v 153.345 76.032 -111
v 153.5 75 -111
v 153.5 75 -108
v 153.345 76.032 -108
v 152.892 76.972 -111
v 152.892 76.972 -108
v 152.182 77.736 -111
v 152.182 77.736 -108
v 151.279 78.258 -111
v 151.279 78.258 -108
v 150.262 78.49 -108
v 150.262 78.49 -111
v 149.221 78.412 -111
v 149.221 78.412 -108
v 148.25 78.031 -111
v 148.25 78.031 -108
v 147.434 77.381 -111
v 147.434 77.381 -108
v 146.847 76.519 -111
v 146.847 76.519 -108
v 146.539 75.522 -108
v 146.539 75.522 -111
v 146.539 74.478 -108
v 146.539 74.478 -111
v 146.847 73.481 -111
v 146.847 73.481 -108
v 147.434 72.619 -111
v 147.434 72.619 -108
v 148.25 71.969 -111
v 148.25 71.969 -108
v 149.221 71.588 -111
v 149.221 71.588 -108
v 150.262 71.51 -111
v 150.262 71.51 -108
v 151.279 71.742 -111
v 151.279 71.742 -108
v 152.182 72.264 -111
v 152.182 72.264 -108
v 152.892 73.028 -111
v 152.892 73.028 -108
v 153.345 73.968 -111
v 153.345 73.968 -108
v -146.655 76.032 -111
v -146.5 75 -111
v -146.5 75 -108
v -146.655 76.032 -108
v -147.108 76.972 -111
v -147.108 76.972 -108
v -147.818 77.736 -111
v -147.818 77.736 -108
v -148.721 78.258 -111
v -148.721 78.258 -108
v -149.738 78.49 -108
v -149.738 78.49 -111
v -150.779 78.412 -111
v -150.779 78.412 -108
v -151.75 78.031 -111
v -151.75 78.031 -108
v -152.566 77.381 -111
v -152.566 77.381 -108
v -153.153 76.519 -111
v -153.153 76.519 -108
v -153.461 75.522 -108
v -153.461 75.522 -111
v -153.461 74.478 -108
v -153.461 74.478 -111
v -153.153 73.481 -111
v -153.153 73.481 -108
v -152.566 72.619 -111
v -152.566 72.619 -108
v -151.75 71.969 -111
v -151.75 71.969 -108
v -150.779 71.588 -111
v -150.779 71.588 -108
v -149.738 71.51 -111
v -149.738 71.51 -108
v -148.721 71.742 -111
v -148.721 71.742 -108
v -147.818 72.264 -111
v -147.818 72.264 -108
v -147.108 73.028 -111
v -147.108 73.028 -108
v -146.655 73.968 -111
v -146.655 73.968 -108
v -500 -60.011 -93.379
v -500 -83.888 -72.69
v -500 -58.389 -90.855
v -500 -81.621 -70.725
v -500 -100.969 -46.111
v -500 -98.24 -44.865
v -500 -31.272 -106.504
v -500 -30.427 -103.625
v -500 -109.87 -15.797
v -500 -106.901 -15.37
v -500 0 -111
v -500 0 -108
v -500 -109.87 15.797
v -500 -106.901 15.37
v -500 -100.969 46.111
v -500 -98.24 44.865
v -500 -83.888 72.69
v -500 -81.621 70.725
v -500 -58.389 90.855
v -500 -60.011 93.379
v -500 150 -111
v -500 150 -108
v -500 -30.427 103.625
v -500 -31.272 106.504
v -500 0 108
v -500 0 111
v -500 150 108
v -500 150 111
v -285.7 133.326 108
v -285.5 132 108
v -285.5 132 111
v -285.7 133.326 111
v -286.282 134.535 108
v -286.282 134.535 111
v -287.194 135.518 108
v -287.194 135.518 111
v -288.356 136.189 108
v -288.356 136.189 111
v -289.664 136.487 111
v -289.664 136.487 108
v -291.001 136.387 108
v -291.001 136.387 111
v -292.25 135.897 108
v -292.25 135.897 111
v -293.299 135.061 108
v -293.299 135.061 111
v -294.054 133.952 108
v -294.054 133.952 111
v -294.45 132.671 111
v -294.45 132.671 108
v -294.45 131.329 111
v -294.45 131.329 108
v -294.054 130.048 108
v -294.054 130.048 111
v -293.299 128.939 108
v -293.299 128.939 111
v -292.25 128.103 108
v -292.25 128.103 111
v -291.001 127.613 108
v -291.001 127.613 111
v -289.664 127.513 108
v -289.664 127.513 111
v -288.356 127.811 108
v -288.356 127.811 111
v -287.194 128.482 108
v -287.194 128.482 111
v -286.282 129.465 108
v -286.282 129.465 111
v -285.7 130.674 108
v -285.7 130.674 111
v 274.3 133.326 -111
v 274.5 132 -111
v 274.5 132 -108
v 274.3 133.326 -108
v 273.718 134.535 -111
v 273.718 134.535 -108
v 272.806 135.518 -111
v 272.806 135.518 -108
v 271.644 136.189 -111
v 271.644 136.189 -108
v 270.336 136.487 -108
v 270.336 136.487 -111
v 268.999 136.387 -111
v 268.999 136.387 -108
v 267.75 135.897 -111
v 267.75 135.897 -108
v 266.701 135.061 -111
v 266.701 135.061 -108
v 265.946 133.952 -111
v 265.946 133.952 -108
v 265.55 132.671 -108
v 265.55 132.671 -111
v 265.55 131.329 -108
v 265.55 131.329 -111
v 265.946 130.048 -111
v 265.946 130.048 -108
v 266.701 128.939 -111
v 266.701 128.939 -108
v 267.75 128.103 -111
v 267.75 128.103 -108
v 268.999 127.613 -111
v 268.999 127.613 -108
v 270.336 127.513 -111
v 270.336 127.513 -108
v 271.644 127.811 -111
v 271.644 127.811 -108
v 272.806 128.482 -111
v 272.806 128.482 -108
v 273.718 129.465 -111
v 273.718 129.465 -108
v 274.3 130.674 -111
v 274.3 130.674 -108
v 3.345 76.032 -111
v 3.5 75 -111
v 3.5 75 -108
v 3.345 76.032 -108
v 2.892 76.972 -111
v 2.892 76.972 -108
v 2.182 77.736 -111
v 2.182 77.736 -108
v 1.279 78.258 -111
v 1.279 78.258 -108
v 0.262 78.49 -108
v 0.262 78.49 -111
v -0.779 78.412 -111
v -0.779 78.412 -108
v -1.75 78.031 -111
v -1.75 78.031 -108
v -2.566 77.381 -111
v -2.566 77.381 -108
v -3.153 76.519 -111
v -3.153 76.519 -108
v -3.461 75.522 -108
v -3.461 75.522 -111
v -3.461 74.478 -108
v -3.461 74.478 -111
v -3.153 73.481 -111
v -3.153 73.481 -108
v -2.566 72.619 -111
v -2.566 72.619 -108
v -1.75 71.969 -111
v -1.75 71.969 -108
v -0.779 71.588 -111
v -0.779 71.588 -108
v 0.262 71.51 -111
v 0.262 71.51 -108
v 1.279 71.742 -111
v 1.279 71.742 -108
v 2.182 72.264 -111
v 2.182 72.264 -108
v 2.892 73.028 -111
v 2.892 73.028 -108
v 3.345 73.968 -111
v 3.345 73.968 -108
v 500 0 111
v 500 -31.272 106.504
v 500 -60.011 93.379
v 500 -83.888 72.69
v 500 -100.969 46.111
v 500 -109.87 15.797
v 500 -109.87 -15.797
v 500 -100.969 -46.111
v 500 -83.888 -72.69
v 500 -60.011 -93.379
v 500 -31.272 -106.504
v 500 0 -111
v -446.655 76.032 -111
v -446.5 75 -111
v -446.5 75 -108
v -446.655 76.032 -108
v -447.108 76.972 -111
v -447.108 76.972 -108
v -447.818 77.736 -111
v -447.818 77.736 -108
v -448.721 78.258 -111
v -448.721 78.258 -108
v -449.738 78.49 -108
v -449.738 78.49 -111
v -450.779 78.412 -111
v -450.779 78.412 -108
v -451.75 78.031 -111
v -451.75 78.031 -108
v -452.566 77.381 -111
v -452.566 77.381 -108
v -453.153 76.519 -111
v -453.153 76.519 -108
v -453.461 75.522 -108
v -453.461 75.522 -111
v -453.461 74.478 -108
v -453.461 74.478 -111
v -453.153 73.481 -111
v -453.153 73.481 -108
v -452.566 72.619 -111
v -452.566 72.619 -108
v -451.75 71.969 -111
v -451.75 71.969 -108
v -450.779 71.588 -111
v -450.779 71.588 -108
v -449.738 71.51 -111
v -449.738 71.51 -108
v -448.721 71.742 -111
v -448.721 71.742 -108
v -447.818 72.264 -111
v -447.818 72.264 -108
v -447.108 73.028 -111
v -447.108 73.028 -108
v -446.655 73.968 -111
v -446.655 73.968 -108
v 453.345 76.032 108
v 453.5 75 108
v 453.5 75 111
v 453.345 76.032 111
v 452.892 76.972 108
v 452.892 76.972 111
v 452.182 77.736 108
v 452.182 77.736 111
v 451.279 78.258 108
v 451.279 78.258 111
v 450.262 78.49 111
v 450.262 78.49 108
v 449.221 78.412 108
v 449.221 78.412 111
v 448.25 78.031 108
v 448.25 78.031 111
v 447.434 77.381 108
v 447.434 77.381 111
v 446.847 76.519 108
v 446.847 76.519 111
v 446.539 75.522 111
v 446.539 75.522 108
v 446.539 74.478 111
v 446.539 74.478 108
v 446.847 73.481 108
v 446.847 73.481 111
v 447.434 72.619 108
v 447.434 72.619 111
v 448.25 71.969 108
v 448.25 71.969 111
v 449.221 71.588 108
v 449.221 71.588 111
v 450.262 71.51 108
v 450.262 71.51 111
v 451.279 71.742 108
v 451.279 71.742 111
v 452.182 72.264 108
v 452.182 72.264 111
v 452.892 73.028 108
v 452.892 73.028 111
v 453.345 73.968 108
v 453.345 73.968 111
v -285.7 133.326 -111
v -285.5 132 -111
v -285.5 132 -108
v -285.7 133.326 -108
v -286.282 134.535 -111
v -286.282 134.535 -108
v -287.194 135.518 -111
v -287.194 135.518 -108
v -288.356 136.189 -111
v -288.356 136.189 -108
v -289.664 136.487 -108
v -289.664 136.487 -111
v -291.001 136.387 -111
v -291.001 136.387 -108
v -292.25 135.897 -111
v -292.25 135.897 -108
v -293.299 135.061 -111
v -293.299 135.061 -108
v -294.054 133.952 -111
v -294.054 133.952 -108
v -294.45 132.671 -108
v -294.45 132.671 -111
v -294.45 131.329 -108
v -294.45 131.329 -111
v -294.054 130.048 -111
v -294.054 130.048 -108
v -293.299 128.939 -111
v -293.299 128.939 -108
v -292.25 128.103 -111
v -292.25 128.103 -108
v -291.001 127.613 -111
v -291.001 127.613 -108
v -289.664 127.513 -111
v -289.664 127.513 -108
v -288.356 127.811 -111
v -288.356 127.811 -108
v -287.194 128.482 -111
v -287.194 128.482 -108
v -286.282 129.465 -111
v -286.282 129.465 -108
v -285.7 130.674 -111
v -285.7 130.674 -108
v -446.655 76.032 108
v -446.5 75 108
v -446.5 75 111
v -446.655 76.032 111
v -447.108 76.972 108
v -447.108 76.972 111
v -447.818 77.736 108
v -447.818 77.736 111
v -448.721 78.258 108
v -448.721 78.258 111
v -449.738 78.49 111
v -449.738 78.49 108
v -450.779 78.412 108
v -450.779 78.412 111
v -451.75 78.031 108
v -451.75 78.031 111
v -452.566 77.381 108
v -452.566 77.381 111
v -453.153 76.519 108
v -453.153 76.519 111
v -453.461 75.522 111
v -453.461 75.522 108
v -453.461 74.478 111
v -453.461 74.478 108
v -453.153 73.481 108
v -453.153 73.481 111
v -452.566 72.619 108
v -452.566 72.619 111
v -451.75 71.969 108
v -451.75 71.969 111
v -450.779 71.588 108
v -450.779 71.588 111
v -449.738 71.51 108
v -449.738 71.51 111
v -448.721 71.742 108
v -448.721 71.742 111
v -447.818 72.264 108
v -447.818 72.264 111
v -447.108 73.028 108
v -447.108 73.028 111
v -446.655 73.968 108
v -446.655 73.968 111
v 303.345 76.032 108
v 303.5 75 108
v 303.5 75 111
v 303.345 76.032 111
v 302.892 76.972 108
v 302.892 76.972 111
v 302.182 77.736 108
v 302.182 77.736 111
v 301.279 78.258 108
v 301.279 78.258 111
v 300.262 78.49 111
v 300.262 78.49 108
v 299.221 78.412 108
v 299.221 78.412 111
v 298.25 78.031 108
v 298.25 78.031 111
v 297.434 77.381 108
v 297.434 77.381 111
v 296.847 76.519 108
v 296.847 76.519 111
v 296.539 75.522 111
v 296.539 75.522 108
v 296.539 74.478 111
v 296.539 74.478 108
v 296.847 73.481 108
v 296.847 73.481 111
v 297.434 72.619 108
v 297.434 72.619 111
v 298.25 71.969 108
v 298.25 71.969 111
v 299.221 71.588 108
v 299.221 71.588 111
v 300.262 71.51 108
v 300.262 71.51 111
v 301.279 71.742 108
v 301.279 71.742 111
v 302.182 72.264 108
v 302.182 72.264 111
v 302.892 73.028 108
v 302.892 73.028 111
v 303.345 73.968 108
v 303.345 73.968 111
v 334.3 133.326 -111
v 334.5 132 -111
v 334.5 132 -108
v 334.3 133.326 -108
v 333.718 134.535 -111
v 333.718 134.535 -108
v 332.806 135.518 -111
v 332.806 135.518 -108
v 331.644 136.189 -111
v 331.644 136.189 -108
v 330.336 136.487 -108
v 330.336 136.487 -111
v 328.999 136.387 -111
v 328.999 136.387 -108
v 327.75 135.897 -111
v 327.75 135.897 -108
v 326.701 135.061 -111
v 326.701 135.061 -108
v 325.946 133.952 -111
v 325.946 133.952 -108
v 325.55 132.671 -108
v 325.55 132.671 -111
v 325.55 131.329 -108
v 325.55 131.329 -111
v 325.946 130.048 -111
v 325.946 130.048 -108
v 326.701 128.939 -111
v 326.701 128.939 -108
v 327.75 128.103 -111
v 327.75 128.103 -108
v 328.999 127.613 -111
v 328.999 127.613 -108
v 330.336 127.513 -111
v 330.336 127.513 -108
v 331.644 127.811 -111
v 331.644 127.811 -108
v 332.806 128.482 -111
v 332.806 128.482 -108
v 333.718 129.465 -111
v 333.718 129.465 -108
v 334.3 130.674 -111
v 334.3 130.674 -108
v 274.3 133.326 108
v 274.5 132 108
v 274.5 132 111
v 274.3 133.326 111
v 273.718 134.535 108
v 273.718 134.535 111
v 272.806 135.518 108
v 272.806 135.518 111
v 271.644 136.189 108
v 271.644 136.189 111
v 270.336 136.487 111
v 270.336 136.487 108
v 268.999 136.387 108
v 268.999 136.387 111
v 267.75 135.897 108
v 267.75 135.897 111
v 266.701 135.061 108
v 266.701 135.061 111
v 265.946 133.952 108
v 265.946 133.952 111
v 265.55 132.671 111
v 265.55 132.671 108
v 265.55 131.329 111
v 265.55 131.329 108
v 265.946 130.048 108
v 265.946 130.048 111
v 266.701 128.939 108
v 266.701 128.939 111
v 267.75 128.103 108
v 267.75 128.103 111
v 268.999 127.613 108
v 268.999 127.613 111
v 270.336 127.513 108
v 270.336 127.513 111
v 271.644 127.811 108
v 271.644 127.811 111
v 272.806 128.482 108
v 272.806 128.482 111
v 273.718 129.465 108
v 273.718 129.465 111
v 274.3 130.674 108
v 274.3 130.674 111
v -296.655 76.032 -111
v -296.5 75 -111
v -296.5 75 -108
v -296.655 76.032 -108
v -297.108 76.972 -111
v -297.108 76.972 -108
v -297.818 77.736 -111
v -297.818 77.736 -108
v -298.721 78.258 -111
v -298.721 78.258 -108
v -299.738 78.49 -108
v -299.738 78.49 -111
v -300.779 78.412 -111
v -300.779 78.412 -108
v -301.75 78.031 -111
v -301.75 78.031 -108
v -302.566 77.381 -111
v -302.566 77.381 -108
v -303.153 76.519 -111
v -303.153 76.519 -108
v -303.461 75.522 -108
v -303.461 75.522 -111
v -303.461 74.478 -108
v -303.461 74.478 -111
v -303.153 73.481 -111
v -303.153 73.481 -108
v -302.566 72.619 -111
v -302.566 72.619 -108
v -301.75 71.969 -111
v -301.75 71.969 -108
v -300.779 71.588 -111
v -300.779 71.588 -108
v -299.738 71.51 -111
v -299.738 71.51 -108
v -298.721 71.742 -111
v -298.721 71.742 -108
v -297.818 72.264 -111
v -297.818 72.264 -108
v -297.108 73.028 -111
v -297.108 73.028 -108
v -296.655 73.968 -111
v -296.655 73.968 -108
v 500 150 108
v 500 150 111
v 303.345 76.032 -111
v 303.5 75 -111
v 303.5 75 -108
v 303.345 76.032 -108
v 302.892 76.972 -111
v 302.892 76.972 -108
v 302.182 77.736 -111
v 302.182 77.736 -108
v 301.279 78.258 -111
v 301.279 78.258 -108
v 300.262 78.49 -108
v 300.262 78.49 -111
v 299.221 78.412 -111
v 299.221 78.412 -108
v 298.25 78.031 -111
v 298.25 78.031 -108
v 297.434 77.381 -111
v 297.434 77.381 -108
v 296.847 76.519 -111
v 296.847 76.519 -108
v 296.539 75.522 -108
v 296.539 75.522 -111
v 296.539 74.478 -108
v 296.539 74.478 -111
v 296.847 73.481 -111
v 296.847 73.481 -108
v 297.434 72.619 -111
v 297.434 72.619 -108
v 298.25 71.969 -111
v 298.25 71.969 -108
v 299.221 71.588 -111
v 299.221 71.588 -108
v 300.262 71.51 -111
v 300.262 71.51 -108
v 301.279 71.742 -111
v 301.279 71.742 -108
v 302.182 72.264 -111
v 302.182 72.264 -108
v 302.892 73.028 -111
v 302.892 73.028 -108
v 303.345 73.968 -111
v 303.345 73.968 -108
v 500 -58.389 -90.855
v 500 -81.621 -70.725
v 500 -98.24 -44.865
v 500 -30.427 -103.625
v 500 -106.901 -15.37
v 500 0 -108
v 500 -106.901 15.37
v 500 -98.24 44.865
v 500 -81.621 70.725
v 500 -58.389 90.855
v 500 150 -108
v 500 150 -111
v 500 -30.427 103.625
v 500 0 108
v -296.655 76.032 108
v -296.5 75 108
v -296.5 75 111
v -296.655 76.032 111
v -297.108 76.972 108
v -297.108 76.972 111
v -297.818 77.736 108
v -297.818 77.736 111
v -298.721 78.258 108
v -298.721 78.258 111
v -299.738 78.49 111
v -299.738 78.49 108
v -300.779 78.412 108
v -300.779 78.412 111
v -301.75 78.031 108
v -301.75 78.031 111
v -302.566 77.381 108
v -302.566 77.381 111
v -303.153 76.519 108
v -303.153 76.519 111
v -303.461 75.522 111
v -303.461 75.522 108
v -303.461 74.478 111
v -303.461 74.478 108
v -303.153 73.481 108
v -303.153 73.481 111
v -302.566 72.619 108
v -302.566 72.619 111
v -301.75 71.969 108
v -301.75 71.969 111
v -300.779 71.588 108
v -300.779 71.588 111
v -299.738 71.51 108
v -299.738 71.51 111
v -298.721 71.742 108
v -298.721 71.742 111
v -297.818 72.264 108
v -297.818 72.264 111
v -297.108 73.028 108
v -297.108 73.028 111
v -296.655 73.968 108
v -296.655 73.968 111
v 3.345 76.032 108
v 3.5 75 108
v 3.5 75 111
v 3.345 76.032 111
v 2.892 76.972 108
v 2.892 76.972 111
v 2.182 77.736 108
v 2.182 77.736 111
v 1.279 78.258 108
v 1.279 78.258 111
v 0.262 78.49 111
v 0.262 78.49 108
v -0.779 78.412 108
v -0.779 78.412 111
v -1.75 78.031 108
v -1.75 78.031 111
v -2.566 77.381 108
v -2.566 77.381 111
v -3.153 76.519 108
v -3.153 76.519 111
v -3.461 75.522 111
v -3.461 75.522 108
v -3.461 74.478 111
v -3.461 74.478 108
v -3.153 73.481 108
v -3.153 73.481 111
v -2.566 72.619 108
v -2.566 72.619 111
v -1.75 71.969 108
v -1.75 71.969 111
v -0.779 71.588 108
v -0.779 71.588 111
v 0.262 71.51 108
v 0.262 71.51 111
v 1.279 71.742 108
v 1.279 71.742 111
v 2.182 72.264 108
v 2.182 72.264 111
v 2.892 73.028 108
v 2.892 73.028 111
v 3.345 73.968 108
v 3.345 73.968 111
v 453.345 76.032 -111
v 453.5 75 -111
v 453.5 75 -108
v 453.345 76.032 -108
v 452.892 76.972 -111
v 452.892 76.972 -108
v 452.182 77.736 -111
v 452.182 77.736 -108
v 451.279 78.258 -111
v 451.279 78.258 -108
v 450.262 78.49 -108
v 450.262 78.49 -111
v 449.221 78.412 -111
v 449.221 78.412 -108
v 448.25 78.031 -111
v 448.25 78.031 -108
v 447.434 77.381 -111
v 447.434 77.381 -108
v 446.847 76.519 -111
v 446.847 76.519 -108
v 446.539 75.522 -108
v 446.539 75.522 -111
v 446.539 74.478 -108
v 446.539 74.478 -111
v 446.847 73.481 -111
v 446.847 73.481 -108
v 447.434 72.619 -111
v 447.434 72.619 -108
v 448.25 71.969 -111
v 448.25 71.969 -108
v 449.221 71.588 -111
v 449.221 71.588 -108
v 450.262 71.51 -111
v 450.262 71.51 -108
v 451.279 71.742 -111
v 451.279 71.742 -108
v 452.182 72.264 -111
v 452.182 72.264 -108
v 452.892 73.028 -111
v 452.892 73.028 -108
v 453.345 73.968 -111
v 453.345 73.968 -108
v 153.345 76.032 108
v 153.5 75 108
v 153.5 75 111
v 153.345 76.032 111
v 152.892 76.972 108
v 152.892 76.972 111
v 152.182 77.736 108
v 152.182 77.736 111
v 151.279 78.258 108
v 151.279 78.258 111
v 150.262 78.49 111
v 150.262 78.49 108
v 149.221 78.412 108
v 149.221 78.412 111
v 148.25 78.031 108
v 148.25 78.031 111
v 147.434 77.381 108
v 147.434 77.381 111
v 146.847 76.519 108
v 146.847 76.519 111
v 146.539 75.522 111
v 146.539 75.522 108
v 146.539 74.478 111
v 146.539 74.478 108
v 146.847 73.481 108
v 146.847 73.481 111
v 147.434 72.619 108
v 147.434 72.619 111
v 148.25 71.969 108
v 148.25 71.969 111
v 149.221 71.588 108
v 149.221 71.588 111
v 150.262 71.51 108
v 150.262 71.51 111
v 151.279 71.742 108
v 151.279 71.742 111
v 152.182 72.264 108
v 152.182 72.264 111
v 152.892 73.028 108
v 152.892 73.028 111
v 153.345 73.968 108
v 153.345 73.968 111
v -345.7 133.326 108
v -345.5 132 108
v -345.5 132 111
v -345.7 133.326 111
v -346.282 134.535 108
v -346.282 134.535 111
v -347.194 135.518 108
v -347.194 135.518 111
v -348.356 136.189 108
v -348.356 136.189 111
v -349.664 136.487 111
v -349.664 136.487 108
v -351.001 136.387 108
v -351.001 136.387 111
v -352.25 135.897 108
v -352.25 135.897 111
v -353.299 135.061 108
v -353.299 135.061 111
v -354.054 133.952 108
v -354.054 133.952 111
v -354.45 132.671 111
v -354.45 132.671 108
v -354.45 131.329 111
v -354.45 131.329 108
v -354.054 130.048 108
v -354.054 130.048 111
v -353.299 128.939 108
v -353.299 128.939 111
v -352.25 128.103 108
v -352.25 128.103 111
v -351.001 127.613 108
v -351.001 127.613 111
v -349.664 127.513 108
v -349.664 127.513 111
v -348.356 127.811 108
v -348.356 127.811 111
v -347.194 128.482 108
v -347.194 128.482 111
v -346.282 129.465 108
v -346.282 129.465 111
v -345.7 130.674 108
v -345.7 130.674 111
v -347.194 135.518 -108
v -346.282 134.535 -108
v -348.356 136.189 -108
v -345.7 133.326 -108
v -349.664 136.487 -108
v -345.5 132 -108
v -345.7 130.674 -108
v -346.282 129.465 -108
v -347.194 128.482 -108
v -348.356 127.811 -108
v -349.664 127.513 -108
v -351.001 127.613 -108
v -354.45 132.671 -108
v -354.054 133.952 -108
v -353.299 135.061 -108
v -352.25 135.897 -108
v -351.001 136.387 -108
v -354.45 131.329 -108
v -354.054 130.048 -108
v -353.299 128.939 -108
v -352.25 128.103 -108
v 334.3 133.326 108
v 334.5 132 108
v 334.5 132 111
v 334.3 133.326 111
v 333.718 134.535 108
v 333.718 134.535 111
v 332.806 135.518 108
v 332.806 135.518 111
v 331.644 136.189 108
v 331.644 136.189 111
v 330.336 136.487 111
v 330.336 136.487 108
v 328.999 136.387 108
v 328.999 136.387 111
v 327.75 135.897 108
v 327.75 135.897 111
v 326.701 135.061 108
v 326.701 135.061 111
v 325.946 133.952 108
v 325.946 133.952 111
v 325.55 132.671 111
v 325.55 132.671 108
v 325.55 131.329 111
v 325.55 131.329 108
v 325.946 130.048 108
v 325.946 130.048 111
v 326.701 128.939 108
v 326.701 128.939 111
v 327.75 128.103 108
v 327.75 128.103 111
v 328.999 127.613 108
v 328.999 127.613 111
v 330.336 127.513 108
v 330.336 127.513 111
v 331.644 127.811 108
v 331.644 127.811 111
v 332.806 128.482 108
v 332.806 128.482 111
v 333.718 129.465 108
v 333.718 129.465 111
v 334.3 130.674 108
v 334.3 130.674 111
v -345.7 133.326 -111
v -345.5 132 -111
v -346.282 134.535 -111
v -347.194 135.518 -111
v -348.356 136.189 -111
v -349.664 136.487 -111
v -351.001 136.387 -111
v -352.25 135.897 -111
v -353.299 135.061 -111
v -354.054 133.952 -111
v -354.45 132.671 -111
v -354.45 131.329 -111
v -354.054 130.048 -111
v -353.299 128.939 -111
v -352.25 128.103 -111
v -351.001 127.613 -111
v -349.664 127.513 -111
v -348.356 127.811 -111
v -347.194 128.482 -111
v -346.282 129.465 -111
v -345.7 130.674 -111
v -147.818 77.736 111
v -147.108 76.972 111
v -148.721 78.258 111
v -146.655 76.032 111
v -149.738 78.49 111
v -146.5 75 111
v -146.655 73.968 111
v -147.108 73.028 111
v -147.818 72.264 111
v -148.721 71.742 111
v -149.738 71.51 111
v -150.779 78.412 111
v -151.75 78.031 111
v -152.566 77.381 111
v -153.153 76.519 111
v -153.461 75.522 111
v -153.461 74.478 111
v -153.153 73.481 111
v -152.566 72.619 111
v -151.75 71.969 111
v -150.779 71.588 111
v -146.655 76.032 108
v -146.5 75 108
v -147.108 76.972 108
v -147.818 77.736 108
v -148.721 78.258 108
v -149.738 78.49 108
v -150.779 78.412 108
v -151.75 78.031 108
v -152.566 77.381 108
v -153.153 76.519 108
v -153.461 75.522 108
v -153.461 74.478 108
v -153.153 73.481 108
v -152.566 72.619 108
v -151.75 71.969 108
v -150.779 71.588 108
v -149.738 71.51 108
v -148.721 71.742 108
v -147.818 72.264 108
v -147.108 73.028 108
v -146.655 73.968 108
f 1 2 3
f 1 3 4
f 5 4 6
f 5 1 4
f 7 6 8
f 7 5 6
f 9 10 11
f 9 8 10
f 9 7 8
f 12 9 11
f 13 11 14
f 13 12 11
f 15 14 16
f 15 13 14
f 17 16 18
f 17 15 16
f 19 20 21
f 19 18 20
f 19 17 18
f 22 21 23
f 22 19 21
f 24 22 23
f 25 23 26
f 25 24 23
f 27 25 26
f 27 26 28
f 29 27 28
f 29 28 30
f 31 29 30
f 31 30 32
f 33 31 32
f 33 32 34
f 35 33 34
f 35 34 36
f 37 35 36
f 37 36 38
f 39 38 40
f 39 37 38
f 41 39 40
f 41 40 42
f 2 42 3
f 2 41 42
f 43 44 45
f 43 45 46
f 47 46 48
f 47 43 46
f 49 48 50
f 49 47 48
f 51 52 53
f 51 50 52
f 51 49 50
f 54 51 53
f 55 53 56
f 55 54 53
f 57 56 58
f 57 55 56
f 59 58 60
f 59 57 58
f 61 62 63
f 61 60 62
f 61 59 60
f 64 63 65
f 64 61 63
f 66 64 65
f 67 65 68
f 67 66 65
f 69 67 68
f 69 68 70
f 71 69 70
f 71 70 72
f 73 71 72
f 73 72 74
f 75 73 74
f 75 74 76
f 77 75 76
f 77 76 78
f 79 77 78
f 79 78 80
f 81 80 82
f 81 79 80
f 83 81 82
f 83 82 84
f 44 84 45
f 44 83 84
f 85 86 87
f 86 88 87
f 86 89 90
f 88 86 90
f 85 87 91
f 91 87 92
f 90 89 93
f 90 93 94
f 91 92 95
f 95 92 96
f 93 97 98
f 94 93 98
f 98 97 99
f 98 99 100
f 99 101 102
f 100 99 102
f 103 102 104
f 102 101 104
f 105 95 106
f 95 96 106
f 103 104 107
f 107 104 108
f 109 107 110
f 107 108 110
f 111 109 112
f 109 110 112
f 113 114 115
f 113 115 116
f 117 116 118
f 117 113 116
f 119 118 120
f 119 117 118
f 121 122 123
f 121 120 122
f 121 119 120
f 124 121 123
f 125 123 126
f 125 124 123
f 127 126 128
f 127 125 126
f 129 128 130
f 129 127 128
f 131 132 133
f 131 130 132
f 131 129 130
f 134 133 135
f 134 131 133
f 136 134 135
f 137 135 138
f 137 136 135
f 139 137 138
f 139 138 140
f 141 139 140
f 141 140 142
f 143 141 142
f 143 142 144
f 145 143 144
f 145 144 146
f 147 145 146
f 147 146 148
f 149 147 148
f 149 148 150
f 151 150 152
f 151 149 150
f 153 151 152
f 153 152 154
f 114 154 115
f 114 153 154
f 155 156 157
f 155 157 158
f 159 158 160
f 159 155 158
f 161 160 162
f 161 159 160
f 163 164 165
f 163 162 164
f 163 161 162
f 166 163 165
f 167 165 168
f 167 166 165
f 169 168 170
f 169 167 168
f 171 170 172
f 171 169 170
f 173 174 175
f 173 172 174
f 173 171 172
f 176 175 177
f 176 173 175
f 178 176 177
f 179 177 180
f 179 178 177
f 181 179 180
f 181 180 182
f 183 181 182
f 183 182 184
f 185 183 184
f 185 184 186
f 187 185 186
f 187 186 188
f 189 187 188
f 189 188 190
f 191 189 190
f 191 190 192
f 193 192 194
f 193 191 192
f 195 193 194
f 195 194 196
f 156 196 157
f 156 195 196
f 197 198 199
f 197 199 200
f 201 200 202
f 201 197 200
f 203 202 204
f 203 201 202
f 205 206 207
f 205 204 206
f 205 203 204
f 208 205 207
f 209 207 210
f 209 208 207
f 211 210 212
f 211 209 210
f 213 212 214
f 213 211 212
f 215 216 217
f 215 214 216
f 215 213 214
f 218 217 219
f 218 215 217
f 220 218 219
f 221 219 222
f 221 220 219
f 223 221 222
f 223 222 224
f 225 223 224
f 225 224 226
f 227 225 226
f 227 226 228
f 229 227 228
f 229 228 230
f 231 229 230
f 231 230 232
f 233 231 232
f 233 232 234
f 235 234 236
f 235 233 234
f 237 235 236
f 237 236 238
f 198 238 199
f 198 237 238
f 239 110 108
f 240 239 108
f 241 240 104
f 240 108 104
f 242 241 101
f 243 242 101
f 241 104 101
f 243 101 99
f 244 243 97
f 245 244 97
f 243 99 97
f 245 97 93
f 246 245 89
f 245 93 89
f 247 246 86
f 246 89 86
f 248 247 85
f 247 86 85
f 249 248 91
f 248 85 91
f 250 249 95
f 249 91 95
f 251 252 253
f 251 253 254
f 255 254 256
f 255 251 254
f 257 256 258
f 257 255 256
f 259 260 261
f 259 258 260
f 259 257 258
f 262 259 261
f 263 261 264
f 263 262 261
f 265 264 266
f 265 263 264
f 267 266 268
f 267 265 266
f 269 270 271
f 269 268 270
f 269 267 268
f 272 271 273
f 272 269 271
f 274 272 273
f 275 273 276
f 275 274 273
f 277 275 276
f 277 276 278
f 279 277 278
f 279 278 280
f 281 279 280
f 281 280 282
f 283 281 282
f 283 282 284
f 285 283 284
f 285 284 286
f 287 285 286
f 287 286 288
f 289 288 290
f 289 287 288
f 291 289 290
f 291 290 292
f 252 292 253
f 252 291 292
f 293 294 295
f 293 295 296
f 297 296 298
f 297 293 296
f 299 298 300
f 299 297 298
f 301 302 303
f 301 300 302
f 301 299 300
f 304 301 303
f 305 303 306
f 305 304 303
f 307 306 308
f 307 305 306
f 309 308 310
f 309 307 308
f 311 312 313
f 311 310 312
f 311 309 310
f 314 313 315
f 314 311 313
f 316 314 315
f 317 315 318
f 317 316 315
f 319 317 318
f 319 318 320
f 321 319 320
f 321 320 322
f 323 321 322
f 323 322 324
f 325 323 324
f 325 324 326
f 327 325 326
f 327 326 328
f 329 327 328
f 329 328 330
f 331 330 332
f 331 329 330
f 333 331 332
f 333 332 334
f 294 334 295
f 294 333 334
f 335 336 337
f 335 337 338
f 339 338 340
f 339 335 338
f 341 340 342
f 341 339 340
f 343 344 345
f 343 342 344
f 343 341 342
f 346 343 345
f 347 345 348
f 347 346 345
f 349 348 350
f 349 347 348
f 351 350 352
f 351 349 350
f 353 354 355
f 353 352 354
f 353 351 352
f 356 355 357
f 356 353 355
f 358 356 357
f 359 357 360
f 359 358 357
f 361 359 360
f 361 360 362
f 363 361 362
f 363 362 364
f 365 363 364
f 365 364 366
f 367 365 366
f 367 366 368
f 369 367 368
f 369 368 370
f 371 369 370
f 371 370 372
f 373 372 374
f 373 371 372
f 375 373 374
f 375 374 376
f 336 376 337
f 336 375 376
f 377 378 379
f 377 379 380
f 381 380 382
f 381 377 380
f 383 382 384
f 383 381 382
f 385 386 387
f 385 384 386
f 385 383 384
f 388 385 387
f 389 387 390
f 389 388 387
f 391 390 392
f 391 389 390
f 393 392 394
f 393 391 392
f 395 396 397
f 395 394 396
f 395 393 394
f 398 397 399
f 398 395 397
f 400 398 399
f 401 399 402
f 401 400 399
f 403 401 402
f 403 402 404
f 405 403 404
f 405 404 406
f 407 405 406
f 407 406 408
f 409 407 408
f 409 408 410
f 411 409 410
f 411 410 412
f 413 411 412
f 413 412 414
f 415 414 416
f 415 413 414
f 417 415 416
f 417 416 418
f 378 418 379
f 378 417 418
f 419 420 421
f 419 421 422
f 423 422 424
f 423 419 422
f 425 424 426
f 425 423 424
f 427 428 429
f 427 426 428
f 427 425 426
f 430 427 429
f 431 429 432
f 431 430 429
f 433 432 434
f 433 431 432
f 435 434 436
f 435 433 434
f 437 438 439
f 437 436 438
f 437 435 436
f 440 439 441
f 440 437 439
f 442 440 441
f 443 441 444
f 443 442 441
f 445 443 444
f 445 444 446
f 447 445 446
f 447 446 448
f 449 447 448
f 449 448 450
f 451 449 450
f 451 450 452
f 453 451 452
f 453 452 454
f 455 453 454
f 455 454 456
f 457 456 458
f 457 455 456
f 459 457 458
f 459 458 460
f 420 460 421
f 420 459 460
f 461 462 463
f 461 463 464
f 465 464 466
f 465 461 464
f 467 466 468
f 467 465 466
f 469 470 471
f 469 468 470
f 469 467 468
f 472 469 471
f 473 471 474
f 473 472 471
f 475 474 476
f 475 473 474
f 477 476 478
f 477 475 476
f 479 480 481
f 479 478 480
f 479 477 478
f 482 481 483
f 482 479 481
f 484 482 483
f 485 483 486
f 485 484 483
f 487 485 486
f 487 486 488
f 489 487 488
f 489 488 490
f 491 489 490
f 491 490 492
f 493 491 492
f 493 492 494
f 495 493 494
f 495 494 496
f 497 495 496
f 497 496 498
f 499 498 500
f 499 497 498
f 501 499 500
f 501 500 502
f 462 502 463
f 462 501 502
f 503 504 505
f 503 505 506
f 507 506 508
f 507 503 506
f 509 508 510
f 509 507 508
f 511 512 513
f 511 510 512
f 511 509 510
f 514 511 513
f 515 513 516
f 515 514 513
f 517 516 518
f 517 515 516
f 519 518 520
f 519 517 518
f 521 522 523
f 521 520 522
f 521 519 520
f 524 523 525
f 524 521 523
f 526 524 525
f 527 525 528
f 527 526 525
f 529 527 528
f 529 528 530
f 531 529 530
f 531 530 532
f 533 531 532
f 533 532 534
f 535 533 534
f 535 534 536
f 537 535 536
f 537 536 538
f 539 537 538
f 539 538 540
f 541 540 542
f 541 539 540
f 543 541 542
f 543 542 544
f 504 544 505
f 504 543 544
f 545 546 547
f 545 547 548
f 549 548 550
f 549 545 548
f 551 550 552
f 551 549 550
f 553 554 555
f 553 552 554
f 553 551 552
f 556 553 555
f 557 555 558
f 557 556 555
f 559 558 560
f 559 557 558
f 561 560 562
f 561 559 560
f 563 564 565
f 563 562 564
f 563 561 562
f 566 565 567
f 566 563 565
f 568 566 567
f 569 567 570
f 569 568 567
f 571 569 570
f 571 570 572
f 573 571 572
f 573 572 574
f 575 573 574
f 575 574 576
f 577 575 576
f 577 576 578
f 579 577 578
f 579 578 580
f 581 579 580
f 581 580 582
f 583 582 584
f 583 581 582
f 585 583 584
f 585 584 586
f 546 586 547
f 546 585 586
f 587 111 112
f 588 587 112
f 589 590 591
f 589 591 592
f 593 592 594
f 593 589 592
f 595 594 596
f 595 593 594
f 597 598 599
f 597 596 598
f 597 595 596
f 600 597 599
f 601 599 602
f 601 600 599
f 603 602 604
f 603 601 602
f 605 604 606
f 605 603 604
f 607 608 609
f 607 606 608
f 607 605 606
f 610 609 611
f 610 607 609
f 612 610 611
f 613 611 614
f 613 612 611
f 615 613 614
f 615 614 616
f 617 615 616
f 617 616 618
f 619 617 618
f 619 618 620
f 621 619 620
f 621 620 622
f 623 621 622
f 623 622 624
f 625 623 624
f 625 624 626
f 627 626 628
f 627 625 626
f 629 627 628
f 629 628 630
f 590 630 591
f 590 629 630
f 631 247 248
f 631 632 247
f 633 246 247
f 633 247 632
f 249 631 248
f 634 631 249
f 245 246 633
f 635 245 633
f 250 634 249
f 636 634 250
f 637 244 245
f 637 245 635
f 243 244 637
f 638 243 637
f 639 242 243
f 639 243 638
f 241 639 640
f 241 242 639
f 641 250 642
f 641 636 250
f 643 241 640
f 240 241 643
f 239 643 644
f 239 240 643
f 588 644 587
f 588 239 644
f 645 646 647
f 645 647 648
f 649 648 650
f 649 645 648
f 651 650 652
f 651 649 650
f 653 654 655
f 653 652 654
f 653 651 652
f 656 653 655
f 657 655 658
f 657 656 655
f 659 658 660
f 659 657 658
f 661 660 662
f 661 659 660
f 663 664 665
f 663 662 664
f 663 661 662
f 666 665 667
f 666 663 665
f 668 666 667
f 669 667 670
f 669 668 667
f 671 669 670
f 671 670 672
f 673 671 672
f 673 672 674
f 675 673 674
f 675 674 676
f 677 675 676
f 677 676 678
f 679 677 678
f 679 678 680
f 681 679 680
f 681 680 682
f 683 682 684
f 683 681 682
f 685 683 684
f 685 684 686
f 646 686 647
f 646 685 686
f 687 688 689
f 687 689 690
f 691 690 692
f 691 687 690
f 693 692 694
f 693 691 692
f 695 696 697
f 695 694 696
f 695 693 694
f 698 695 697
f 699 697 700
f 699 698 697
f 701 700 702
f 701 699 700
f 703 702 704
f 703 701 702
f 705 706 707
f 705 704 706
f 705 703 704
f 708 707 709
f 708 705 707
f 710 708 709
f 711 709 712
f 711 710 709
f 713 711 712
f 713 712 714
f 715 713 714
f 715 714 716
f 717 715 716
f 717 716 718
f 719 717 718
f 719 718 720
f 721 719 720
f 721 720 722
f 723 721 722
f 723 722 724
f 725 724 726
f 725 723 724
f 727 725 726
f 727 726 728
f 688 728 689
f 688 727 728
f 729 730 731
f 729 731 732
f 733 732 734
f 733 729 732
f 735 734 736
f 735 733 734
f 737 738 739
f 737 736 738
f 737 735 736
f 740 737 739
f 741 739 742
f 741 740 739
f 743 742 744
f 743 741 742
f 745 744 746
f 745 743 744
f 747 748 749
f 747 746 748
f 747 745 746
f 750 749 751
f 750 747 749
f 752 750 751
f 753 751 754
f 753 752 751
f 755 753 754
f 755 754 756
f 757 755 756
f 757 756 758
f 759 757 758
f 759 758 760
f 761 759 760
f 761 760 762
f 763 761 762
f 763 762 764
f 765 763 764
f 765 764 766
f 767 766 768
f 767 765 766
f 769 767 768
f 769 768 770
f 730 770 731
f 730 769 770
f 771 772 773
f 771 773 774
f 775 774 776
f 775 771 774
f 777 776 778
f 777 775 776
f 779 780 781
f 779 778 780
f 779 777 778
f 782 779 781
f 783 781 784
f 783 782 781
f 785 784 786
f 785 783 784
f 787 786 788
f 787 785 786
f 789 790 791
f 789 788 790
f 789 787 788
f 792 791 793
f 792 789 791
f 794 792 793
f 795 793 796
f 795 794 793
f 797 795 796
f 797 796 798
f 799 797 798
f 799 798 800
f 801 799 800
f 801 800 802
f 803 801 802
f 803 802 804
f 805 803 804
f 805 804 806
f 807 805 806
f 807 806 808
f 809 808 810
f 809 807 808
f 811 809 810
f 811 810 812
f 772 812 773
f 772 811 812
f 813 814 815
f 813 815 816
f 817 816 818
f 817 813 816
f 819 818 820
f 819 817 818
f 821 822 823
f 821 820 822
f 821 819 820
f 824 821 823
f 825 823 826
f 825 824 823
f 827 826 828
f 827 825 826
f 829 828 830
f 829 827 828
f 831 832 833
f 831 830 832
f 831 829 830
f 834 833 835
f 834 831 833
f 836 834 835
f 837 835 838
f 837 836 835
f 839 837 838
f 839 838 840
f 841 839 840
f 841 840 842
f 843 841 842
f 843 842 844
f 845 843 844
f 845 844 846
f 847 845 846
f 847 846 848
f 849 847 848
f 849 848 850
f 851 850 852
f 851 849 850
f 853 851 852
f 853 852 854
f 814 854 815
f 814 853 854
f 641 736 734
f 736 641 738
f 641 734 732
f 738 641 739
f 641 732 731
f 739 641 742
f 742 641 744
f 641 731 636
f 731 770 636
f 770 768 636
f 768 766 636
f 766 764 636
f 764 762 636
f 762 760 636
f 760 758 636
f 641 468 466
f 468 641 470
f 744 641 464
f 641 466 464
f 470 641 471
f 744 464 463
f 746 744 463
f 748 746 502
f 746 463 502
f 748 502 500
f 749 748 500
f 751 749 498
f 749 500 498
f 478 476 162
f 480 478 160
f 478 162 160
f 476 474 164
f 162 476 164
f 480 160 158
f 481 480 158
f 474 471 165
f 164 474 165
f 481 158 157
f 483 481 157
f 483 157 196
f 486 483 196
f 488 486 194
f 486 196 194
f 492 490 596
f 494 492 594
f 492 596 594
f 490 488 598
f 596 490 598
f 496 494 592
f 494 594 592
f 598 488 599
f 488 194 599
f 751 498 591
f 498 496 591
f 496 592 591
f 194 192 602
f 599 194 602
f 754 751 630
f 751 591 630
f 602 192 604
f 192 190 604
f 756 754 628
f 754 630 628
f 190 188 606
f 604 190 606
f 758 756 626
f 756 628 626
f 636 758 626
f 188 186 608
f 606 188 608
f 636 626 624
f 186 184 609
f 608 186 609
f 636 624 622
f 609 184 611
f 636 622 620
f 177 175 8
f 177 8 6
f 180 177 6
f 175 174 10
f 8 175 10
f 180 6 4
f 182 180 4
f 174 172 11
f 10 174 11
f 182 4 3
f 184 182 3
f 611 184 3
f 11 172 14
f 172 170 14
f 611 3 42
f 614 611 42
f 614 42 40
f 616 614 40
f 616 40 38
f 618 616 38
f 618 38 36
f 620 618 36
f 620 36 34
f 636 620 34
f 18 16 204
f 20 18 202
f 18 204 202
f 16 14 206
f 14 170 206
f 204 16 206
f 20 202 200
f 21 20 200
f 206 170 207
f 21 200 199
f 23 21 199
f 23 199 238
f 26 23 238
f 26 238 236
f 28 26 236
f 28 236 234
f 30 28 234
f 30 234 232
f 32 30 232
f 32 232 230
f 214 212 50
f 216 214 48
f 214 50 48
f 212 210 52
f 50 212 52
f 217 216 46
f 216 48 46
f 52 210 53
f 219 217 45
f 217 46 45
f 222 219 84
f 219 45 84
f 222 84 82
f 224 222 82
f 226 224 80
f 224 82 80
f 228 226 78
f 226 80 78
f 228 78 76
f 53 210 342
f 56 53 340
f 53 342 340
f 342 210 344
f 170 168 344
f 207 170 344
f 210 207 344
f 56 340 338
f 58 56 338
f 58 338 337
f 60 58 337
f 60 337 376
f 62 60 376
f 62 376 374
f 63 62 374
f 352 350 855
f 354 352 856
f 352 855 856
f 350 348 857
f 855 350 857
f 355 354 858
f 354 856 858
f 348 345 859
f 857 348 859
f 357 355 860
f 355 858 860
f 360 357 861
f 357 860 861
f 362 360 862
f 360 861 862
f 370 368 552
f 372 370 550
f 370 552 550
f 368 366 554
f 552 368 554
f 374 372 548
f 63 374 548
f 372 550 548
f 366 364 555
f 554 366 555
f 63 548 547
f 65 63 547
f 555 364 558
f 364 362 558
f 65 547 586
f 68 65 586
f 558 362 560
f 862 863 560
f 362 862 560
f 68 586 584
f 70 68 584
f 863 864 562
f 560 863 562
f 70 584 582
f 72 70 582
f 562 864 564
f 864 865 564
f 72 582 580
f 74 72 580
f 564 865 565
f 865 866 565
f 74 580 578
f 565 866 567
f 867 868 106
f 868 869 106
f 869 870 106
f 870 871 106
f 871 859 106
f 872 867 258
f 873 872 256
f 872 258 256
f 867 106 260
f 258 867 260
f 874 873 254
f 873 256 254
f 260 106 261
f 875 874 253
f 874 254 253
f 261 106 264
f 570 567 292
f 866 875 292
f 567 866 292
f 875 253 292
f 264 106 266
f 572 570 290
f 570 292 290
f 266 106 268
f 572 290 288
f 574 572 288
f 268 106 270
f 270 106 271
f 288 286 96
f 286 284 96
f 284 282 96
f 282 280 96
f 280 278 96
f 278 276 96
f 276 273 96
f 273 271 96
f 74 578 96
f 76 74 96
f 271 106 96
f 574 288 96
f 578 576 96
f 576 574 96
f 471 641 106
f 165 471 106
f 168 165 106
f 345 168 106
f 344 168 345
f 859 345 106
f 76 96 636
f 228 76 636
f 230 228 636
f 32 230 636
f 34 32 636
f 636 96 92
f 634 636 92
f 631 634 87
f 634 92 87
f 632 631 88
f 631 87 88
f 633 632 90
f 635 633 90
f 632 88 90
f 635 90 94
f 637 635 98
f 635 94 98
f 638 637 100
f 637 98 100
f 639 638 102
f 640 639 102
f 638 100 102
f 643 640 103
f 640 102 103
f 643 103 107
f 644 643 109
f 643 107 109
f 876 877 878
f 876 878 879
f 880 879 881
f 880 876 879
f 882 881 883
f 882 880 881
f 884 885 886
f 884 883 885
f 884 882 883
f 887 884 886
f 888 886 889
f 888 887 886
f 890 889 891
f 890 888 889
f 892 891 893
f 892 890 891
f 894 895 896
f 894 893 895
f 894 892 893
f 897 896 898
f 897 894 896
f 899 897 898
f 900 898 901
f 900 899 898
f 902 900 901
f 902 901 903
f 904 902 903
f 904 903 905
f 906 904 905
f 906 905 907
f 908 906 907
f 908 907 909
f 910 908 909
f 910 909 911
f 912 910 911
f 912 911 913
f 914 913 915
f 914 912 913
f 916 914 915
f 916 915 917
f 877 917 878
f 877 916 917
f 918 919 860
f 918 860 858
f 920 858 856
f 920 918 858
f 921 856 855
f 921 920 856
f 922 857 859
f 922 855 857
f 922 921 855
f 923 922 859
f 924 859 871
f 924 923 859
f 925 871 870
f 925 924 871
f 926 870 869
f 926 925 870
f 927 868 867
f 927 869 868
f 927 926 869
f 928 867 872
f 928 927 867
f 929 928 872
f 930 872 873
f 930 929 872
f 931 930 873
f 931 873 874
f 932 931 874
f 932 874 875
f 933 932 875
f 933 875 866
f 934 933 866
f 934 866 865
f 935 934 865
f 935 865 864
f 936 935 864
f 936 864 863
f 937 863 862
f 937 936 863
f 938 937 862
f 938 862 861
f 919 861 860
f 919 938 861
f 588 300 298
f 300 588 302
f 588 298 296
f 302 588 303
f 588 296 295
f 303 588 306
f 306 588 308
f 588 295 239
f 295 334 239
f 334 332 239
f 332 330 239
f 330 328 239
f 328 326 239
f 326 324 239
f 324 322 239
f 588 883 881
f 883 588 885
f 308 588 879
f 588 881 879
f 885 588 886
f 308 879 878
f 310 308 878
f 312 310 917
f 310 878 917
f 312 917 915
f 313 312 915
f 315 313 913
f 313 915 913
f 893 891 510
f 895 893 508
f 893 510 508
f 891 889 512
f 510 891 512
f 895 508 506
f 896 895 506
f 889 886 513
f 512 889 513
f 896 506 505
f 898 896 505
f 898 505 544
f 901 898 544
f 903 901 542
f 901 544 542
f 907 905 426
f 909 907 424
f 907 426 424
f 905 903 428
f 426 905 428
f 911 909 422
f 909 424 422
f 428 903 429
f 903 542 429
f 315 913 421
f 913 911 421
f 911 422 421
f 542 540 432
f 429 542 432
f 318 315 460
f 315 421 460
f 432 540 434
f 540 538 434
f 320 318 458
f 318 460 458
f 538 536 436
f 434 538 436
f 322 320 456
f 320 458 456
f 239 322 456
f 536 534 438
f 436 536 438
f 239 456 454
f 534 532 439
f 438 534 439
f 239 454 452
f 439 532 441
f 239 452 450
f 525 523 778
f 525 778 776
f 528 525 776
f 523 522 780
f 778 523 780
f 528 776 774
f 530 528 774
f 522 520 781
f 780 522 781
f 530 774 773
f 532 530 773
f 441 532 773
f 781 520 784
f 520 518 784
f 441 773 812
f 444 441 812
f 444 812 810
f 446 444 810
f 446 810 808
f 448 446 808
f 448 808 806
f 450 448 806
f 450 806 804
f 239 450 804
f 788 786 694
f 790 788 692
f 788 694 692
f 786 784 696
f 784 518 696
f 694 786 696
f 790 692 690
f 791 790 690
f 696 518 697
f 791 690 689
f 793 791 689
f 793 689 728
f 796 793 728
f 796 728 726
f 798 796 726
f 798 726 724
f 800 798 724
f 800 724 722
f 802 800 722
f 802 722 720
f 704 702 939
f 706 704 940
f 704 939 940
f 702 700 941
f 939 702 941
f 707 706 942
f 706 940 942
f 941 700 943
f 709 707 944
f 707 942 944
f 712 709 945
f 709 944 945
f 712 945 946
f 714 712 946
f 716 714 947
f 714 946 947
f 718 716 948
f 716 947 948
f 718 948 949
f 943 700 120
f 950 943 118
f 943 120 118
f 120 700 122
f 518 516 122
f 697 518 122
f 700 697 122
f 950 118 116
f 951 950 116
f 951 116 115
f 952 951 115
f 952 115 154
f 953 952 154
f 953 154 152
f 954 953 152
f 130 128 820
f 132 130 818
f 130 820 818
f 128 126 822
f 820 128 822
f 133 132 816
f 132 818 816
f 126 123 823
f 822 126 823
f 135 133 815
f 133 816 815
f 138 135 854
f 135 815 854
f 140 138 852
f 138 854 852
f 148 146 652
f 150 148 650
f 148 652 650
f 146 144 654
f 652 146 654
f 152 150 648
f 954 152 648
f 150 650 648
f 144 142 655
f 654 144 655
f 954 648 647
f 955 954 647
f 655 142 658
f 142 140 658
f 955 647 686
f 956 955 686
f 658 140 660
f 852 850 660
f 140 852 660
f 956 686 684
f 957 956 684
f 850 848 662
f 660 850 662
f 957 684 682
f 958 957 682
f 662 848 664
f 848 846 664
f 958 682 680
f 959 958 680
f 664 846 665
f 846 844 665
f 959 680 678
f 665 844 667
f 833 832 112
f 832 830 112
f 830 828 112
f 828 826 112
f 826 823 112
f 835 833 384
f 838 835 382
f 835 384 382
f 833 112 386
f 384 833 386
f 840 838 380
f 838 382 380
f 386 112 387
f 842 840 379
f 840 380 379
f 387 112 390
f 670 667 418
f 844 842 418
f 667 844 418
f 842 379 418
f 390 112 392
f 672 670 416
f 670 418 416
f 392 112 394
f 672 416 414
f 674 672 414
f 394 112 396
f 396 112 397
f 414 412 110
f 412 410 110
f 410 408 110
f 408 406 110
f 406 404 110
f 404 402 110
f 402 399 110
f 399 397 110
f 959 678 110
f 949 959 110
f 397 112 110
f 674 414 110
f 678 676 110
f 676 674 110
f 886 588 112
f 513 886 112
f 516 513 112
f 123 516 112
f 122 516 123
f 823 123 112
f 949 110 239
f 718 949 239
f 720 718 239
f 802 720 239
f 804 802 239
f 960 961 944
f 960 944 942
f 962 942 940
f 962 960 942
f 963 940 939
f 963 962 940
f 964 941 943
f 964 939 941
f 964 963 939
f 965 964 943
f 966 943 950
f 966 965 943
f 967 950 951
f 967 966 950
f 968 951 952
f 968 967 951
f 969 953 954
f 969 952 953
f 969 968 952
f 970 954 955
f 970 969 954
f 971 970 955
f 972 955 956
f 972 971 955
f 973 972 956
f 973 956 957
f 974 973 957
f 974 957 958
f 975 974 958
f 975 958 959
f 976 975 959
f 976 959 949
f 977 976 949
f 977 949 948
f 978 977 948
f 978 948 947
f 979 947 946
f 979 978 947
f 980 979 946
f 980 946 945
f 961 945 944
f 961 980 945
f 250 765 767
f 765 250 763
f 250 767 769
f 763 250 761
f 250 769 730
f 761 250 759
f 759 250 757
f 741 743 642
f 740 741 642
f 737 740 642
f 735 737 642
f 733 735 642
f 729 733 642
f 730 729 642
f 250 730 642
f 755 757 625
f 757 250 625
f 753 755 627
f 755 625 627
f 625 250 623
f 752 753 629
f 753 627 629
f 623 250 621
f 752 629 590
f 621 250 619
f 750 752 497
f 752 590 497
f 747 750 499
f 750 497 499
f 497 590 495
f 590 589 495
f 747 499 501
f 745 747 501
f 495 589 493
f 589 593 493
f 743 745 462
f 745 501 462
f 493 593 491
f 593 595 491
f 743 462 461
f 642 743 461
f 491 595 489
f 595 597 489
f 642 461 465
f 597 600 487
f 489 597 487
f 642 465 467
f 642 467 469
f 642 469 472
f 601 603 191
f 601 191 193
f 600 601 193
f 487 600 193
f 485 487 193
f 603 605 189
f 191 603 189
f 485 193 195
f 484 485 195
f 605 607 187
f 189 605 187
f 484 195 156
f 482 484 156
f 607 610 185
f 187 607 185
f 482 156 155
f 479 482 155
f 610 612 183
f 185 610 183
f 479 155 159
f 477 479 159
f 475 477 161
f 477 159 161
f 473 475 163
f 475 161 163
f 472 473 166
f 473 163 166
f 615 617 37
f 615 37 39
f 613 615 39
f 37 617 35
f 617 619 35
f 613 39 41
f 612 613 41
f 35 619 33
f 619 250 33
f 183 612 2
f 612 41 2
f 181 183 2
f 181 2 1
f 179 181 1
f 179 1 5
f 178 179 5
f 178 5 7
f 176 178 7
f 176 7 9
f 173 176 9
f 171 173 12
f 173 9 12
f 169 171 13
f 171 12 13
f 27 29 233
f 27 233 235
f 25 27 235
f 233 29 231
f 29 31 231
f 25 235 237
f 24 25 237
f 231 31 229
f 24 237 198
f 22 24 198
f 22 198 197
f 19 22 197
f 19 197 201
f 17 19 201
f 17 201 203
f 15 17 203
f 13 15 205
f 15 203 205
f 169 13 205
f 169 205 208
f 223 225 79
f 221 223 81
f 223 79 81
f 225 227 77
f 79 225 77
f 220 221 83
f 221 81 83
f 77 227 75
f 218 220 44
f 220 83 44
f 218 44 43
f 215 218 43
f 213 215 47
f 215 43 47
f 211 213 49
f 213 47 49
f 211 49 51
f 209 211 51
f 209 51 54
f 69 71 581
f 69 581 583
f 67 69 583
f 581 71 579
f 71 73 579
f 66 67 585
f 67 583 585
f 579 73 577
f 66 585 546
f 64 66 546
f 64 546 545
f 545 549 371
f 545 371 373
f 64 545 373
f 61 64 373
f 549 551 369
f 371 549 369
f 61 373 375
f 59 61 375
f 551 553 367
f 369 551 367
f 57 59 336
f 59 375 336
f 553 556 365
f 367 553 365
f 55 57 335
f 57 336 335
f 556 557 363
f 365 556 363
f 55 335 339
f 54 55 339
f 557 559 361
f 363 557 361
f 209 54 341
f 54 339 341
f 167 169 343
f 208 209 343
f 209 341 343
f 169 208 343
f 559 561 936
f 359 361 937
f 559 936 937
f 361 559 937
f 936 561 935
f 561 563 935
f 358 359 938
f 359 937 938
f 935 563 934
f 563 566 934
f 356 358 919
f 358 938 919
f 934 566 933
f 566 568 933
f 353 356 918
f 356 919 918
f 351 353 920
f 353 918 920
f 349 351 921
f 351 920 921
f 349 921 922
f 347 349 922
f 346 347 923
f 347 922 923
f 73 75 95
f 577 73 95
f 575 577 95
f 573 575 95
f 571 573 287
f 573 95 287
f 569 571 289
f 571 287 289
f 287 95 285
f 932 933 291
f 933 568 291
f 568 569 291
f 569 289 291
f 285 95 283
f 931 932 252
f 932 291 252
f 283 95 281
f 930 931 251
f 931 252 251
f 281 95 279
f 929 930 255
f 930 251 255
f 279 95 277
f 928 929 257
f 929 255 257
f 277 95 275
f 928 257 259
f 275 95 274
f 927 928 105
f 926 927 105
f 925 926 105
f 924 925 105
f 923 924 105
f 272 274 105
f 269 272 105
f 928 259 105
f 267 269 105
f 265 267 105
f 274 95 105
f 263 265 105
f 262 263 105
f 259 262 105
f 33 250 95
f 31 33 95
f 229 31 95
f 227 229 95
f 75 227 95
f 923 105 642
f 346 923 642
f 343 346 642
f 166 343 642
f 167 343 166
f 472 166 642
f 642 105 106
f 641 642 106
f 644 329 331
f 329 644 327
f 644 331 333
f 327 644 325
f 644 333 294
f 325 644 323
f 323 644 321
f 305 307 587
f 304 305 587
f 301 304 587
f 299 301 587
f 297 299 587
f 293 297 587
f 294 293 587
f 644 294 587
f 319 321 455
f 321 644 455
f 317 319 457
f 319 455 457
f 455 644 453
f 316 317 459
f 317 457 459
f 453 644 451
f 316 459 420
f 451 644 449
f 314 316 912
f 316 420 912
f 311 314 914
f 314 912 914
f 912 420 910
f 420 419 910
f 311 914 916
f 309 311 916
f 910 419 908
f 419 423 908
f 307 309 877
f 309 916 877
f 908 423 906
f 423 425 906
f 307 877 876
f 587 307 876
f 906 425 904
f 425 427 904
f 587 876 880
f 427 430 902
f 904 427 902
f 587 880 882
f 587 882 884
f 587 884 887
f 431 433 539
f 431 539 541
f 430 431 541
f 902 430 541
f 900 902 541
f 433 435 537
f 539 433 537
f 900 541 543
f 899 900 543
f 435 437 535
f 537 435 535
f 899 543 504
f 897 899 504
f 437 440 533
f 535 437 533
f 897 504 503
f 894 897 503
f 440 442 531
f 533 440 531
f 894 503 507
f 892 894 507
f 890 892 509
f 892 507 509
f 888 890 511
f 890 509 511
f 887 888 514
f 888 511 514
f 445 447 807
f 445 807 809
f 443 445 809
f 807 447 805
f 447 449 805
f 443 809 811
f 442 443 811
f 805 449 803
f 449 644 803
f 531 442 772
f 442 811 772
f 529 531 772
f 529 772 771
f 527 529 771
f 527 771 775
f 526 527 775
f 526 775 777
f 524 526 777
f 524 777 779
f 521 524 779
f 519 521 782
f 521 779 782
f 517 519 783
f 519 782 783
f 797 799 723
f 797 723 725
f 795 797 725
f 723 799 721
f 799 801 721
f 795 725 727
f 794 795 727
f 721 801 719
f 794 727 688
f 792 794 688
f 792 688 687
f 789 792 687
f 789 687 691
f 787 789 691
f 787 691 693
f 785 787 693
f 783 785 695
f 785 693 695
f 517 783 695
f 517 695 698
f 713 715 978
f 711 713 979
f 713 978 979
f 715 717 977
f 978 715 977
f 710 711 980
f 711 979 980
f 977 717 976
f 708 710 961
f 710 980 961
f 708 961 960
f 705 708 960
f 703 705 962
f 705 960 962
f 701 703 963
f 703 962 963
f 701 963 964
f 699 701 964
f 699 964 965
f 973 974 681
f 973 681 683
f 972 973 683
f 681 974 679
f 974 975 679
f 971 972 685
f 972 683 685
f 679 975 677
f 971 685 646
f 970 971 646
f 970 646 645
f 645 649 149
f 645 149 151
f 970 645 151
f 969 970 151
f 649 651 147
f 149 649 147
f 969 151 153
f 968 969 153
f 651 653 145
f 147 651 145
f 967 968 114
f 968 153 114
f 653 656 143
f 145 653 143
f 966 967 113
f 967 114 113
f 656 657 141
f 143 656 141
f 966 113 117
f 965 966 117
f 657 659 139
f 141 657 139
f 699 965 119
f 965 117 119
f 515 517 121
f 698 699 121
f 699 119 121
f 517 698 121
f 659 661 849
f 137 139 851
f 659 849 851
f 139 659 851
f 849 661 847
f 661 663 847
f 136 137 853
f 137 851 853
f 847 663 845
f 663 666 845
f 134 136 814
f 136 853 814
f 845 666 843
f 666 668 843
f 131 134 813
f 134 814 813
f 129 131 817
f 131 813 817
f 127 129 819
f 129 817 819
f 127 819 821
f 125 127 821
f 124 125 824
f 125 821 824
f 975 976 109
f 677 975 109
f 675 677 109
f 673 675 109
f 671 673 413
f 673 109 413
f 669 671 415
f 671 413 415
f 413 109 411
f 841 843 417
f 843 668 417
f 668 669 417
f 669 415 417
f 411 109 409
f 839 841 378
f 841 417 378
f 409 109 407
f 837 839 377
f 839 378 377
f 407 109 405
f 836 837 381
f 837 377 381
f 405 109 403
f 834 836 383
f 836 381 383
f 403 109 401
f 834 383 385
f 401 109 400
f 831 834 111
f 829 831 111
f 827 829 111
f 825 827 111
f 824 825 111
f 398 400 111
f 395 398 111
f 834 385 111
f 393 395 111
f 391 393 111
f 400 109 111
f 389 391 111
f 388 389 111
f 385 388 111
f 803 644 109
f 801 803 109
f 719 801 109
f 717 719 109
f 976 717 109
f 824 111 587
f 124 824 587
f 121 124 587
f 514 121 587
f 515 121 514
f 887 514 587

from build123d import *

# Parameters (mm, degrees)
OTHER_START              = -500
OTHER_2_DEPTH            = 1000
CUT_EXTRUDE_4_DEPTH      = 534.686237409
CUT_EXTRUDE_4_DEPTH_BACK = 534.686237409
SKETCH_13_R              = 3.5
SKETCH_13_R_2            = 4.5


# Read off the part's stored shape, not the designer's step: Элемент по сечениям сгиба2
with BuildPart() as part:
    # Other 2 outline → Other 2 (new body)
    with BuildSketch(Plane.YZ.offset(OTHER_START)):
        with BuildLine():
            Line((0, -111), (150, -111))
            Line((150, -111), (150, -108))
            Line((150, -108), (0, -108))
            ThreePointArc((0, -108), (-108, 0), (0, 108))
            Line((0, 108), (150, 108))
            Line((150, 108), (150, 111))
            Line((150, 111), (0, 111))
            ThreePointArc((0, 111), (-111, 0), (0, -111))
        make_face()
    extrude(amount=OTHER_2_DEPTH)

    # Эскиз13 → Вырез-Вытянуть4 (cut, two sides: drawn at the far end of the back side and taken through both)
    with BuildSketch(Plane.XY.offset(-CUT_EXTRUDE_4_DEPTH_BACK)):
        with Locations((450, 75)):
            Circle(SKETCH_13_R)
        with Locations((300, 75)):
            Circle(SKETCH_13_R)
        with Locations((150, 75)):
            Circle(SKETCH_13_R)
        with Locations((0, 75)):
            Circle(SKETCH_13_R)
        with Locations((-150, 75)):
            Circle(SKETCH_13_R)
        with Locations((-300, 75)):
            Circle(SKETCH_13_R)
        with Locations((-450, 75)):
            Circle(SKETCH_13_R)
        with Locations((330, 132)):
            Circle(SKETCH_13_R_2)
        with Locations((270, 132)):
            Circle(SKETCH_13_R_2)
        with Locations((-350, 132)):
            Circle(SKETCH_13_R_2)
        with Locations((-290, 132)):
            Circle(SKETCH_13_R_2)
    extrude(amount=CUT_EXTRUDE_4_DEPTH + CUT_EXTRUDE_4_DEPTH_BACK, mode=Mode.SUBTRACT)


solid = part.part
